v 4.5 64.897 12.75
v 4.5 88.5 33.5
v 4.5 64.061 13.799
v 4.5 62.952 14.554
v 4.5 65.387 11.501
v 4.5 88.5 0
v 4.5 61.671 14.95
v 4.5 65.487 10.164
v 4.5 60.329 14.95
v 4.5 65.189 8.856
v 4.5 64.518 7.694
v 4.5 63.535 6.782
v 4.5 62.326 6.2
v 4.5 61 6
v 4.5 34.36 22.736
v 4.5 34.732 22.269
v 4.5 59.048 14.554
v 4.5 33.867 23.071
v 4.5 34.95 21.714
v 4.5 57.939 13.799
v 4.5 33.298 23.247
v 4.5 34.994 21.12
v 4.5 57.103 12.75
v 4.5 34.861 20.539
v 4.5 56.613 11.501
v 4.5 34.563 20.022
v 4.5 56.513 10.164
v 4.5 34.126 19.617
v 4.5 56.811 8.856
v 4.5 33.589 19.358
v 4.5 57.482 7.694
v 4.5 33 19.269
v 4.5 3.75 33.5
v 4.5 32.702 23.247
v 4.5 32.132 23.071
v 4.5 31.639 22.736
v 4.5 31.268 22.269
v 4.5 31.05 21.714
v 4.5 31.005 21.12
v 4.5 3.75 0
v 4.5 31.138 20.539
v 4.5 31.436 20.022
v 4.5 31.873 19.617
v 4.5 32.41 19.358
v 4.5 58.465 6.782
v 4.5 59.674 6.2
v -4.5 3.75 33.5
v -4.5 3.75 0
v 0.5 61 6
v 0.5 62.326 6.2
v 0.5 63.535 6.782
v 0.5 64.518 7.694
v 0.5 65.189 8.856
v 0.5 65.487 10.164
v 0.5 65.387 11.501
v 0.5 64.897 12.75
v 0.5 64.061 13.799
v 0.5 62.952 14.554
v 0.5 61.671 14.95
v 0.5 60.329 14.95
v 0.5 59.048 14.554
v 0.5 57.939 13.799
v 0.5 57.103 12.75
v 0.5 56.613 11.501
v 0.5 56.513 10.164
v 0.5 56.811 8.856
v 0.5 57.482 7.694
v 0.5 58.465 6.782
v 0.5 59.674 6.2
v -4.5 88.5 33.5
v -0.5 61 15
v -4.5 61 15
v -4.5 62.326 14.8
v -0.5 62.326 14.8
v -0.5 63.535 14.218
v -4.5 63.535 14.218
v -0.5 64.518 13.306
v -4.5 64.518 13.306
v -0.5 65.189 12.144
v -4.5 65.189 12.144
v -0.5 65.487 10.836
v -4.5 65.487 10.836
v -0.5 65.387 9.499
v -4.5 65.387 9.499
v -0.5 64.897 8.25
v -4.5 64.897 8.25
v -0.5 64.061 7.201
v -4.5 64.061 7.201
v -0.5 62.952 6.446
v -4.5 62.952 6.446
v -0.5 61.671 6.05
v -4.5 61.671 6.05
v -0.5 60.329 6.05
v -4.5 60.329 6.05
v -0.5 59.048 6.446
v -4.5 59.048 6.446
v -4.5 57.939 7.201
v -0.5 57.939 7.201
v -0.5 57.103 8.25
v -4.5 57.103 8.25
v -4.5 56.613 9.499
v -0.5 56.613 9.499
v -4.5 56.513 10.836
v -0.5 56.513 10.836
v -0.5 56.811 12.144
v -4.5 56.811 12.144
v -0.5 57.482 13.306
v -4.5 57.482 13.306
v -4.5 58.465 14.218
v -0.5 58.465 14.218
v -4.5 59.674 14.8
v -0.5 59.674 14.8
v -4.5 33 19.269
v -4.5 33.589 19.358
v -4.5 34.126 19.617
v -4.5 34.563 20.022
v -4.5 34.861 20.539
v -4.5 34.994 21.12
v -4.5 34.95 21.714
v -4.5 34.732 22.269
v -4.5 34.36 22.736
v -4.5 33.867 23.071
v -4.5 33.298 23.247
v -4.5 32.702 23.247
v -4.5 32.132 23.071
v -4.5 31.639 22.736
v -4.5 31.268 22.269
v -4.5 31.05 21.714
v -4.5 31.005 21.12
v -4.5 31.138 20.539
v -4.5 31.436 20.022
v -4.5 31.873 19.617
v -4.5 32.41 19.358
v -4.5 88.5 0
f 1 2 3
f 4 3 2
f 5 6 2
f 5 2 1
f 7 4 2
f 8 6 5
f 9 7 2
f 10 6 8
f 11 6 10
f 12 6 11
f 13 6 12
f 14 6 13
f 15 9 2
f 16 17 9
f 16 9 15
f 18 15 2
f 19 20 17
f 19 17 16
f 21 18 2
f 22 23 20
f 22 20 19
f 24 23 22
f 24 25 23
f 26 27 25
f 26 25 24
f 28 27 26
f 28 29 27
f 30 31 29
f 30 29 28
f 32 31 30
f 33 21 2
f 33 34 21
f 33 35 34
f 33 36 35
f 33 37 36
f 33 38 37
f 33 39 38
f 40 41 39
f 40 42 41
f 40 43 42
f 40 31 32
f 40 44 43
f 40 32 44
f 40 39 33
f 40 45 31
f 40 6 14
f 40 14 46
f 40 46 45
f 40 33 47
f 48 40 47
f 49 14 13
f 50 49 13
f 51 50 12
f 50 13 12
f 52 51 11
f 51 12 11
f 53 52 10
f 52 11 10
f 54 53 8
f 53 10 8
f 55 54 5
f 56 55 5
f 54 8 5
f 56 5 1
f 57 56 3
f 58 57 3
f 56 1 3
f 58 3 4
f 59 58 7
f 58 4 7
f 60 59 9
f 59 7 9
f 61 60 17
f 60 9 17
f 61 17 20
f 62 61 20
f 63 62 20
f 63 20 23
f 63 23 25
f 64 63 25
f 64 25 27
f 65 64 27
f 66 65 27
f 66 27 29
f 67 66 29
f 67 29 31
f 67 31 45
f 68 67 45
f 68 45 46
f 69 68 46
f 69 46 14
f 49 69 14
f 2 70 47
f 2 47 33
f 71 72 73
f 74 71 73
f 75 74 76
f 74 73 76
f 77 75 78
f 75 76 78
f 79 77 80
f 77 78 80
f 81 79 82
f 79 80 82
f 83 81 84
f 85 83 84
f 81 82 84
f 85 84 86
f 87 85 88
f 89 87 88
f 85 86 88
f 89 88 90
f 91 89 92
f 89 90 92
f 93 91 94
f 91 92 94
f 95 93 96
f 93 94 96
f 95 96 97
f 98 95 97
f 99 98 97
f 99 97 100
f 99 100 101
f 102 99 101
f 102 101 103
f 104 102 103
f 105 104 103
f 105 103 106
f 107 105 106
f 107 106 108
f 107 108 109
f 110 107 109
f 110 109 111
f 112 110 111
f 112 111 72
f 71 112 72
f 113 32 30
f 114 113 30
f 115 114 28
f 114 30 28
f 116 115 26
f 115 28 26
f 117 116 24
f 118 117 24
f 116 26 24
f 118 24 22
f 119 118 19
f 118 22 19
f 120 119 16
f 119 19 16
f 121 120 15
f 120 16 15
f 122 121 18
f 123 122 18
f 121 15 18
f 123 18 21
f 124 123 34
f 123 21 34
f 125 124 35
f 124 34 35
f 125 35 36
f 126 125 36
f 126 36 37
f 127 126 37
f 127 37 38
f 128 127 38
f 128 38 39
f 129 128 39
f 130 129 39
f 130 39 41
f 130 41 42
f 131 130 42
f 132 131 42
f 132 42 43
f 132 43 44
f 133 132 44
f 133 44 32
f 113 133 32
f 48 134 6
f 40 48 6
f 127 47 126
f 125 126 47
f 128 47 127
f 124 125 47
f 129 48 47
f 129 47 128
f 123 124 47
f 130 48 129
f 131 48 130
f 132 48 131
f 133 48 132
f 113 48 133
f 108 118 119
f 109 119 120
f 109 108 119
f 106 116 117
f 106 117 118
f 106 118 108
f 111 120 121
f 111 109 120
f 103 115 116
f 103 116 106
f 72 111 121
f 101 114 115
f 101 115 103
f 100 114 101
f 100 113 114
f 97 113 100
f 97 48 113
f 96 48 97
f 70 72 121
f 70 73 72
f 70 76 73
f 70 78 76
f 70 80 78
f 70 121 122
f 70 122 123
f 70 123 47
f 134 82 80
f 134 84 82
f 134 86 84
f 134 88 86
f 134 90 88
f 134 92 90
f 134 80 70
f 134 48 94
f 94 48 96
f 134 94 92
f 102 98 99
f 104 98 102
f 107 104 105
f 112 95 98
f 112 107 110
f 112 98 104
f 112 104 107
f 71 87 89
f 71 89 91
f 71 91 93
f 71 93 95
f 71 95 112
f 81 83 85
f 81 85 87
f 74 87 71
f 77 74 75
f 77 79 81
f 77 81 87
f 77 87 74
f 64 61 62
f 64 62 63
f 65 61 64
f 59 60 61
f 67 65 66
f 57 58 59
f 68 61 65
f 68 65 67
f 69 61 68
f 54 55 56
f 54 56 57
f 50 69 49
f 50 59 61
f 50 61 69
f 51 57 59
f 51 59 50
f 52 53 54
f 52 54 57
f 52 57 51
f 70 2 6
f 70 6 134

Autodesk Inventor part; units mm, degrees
ref_plane "YZ Plane" through (0, 0, 0) normal (1, 0, 0) x (0, 1, 0)
ref_plane "XZ Plane" through (0, 0, 0) normal (0, 1, 0) x (-1, 0, 0)
ref_plane "Work Plane1" through (0, 0, 0) normal (0, 0, 1) x (1, 0, 0)
ref_plane "Work Plane2" through (-89, -40.3889, 33.5) normal (0, 0, 1) x (1, 0, 0)
sketch "Sketch1" plane through (0, 0, 0) normal (0, 0, 1) x (1, 0, 0)
  line L0 (23.5, 88.5) -> (-23.5, 88.5) projected
  line L1 (-23.5, 88.5) -> (-23.5, 36.5) projected
  line L2 (-26.5, 33.5) -> (-89, 33.5) projected
  line L3 (-89, 33.5) -> (-89, -72.5) projected
  line L4 (-89, -72.5) -> (-77, -72.5) projected
  line L5 (-74, -75.5) -> (-74, -93.5) projected
  line L6 (-74, -93.5) -> (74, -93.5) projected
  line L7 (74, -93.5) -> (74, -75.5) projected
  line L8 (77, -72.5) -> (89, -72.5) projected
  line L9 (89, -72.5) -> (89, 33.5) projected
  line L10 (89, 33.5) -> (26.5, 33.5) projected
  line L11 (23.5, 36.5) -> (23.5, 88.5) projected
  line L12 (-4.5, 81.5) -> (-4.5, 36.5) projected
  line L13 (-7.5, 33.5) -> (-13.5, 33.5) projected
  line L14 (-16.5, 36.5) -> (-16.5, 81.5) projected
  line L15 (-13.5, 84.5) -> (-7.5, 84.5) projected
  line L16 (16.5, 81.5) -> (16.5, 36.5) projected
  line L17 (13.5, 33.5) -> (7.5, 33.5) projected
  line L18 (4.5, 36.5) -> (4.5, 81.5) projected
  line L19 (7.5, 84.5) -> (13.5, 84.5) projected
  line L20 (-4.5, 88.5) -> (4.5, 88.5)
  line L21 (4.5, 88.5) -> (4.5, 3.75)
  line L22 (4.5, 3.75) -> (-4.5, 3.75)
  line L23 (-4.5, 3.75) -> (-4.5, 88.5)
  line L24 (-32.2, 4.75) -> (-59.9, 4.75)
  arc A0 (13.5, 33.5) -> (16.5, 36.5) centre (13.5, 36.5) ccw projected
  arc A1 (4.5, 36.5) -> (7.5, 33.5) centre (7.5, 36.5) ccw projected
  arc A2 (7.5, 84.5) -> (4.5, 81.5) centre (7.5, 81.5) ccw projected
  arc A3 (16.5, 81.5) -> (13.5, 84.5) centre (13.5, 81.5) ccw projected
  arc A4 (-4.5, 81.5) -> (-7.5, 84.5) centre (-7.5, 81.5) ccw projected
  arc A5 (-7.5, 33.5) -> (-4.5, 36.5) centre (-7.5, 36.5) ccw projected
  arc A6 (-16.5, 36.5) -> (-13.5, 33.5) centre (-13.5, 36.5) ccw projected
  arc A7 (-13.5, 84.5) -> (-16.5, 81.5) centre (-13.5, 81.5) ccw projected
  arc A8 (-26.5, 33.5) -> (-23.5, 36.5) centre (-26.5, 36.5) ccw projected
  arc A9 (-74, -75.5) -> (-77, -72.5) centre (-77, -75.5) ccw projected
  arc A10 (77, -72.5) -> (74, -75.5) centre (77, -75.5) ccw projected
  arc A11 (23.5, 36.5) -> (26.5, 33.5) centre (26.5, 36.5) ccw projected
  point P0 (0, 0)
  point P1 (-4.5, 81.5)
  point P2 (-4.5, 36.5)
  dimension "d0" = 1
extrude "Extrusion1" add sketch "Sketch1" along normal up to surface (33.5 mm away) contours L21 L18 L22 L23 L12 L0
sketch "Sketch2" plane through (4.5, 3.75, 0) normal (1, 0, 0) x (0, 0, -1)
  circle A0 centre (-21.2694, 29.2497) radius 2 projected
  point P0 (0, -3.75)
extrude "Extrusion2" cut sketch "Sketch2" against normal blind 10
sketch "Sketch3" plane through (4.5, 3.75, 0) normal (1, 0, 0) x (0, 0, -1)
  circle A0 centre (-10.5, 57.25) radius 4.5 projected
  point P0 (0, -3.75)
extrude "Extrusion3" cut sketch "Sketch3" against normal blind 4
sketch "Sketch4" plane through (-4.5, 3.75, 0) normal (-1, 0, 0) x (0, 0, 1)
  circle A0 centre (10.5, 57.25) radius 4.5 projected
  point P0 (0, -3.75)
extrude "Extrusion4" cut sketch "Sketch4" against normal blind 4
properties part number "middle_gear_holder"
